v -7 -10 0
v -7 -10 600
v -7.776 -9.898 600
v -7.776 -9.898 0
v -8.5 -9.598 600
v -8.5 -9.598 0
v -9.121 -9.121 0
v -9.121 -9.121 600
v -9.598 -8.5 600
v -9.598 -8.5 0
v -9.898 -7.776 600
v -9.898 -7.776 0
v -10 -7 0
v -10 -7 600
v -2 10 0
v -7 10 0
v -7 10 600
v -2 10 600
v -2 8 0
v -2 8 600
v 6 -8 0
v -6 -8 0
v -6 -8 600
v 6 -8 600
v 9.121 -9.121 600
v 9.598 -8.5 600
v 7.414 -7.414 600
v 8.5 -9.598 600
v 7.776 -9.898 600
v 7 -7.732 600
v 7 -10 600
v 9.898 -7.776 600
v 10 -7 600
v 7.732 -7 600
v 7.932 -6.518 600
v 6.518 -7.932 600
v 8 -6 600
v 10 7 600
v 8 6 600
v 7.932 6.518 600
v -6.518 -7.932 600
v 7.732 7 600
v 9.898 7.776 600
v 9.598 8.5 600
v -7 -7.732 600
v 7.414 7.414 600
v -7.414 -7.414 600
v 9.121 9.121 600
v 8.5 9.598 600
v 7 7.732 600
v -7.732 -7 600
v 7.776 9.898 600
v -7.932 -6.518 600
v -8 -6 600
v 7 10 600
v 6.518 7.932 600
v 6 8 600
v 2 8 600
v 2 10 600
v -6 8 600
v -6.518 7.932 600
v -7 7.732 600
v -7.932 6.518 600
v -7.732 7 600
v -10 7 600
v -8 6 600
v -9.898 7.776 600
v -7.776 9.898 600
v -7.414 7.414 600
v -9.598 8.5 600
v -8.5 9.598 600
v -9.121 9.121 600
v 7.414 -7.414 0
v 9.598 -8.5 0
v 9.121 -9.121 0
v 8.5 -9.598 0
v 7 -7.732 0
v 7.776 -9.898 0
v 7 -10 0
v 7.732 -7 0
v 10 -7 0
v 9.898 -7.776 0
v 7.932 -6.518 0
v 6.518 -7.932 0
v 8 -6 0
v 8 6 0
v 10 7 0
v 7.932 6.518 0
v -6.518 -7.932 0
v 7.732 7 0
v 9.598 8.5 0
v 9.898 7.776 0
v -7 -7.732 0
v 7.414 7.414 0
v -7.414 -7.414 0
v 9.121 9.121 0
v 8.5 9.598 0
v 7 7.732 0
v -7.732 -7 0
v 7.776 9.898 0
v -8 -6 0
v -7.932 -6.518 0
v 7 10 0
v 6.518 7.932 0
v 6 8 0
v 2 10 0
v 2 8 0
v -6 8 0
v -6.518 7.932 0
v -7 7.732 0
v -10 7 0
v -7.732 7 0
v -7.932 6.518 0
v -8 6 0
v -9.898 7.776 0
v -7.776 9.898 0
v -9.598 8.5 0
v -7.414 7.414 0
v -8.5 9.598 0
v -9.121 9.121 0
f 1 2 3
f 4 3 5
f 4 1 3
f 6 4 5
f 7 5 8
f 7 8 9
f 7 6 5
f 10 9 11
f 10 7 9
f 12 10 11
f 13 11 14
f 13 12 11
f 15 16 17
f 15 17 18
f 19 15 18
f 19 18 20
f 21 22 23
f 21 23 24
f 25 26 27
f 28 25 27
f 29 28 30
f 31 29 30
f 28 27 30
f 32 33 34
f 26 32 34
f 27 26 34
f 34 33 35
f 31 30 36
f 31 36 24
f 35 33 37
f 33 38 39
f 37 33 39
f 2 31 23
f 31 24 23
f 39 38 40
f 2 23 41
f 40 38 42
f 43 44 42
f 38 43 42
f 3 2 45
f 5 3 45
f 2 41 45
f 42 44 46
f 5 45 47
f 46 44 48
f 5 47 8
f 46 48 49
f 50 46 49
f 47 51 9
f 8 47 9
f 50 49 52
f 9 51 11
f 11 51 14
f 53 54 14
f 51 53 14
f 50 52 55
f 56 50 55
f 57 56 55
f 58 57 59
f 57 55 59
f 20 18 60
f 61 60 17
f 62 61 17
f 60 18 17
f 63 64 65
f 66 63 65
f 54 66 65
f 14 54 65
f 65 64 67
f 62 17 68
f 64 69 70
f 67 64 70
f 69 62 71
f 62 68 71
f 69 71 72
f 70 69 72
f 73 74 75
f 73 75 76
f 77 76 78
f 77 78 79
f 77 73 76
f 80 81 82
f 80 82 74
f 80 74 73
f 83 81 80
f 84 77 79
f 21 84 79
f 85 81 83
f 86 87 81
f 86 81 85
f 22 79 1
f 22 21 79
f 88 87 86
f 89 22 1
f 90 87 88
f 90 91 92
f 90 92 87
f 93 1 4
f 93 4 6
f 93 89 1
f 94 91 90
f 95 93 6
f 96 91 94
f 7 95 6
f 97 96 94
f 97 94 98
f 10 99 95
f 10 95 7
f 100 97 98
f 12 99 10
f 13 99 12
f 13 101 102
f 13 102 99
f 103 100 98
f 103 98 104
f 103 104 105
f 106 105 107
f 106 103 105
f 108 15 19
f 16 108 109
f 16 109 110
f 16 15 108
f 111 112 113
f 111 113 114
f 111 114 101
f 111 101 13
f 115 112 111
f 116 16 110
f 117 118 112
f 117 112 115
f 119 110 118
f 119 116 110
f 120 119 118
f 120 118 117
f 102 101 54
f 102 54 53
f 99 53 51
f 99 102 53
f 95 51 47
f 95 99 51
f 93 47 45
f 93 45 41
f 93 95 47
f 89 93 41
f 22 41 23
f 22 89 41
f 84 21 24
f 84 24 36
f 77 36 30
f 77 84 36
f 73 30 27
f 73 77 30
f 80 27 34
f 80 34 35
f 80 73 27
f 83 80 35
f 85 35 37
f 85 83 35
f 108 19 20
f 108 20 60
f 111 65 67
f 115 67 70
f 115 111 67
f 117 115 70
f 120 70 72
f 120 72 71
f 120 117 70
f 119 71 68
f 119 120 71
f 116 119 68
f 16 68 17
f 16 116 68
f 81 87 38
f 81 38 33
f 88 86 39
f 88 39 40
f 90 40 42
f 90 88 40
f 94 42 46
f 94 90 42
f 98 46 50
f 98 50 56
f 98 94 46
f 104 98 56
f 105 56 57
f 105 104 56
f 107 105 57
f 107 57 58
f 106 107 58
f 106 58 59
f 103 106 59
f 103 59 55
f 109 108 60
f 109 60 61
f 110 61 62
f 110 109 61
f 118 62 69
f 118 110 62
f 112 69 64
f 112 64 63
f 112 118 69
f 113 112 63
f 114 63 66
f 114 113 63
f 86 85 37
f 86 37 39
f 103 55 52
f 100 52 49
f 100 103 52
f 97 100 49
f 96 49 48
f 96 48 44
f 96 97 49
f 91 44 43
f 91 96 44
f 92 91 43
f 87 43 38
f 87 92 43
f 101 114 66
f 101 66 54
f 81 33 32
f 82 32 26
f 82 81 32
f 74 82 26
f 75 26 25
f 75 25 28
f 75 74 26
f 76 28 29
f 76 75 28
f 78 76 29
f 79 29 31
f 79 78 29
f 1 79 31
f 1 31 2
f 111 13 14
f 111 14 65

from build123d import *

# Parameters (mm, degrees)
DODANIE_WYCI_GNI_CIE1_DEPTH = 600


with BuildPart() as part:
    # Szkic1 → Dodanie-wyciągnięcie1 (new body)
    with BuildSketch(Plane.XY):
        with BuildLine():
            Line((-10, -7), (-10, 7))
            ThreePointArc((-10, 7), (-9.121320344, 9.121320344), (-7, 10))
            Line((-7, 10), (-2, 10))
            Line((-2, 10), (-2, 8))
            Line((-2, 8), (-6, 8))
            ThreePointArc((-6, 8), (-7.414213562, 7.414213562), (-8, 6))
            Line((-8, 6), (-8, -6))
            ThreePointArc((-8, -6), (-7.414213562, -7.414213562), (-6, -8))
            Line((-6, -8), (6, -8))
            ThreePointArc((6, -8), (7.414213562, -7.414213562), (8, -6))
            Line((8, -6), (8, 6))
            ThreePointArc((8, 6), (7.414213562, 7.414213562), (6, 8))
            Line((6, 8), (2, 8))
            Line((2, 8), (2, 10))
            Line((2, 10), (7, 10))
            ThreePointArc((7, 10), (9.121320344, 9.121320344), (10, 7))
            Line((10, 7), (10, -7))
            ThreePointArc((10, -7), (9.121320344, -9.121320344), (7, -10))
            Line((7, -10), (-7, -10))
            ThreePointArc((-7, -10), (-9.121320344, -9.121320344), (-10, -7))
        make_face()
    extrude(amount=DODANIE_WYCI_GNI_CIE1_DEPTH)


solid = part.part
